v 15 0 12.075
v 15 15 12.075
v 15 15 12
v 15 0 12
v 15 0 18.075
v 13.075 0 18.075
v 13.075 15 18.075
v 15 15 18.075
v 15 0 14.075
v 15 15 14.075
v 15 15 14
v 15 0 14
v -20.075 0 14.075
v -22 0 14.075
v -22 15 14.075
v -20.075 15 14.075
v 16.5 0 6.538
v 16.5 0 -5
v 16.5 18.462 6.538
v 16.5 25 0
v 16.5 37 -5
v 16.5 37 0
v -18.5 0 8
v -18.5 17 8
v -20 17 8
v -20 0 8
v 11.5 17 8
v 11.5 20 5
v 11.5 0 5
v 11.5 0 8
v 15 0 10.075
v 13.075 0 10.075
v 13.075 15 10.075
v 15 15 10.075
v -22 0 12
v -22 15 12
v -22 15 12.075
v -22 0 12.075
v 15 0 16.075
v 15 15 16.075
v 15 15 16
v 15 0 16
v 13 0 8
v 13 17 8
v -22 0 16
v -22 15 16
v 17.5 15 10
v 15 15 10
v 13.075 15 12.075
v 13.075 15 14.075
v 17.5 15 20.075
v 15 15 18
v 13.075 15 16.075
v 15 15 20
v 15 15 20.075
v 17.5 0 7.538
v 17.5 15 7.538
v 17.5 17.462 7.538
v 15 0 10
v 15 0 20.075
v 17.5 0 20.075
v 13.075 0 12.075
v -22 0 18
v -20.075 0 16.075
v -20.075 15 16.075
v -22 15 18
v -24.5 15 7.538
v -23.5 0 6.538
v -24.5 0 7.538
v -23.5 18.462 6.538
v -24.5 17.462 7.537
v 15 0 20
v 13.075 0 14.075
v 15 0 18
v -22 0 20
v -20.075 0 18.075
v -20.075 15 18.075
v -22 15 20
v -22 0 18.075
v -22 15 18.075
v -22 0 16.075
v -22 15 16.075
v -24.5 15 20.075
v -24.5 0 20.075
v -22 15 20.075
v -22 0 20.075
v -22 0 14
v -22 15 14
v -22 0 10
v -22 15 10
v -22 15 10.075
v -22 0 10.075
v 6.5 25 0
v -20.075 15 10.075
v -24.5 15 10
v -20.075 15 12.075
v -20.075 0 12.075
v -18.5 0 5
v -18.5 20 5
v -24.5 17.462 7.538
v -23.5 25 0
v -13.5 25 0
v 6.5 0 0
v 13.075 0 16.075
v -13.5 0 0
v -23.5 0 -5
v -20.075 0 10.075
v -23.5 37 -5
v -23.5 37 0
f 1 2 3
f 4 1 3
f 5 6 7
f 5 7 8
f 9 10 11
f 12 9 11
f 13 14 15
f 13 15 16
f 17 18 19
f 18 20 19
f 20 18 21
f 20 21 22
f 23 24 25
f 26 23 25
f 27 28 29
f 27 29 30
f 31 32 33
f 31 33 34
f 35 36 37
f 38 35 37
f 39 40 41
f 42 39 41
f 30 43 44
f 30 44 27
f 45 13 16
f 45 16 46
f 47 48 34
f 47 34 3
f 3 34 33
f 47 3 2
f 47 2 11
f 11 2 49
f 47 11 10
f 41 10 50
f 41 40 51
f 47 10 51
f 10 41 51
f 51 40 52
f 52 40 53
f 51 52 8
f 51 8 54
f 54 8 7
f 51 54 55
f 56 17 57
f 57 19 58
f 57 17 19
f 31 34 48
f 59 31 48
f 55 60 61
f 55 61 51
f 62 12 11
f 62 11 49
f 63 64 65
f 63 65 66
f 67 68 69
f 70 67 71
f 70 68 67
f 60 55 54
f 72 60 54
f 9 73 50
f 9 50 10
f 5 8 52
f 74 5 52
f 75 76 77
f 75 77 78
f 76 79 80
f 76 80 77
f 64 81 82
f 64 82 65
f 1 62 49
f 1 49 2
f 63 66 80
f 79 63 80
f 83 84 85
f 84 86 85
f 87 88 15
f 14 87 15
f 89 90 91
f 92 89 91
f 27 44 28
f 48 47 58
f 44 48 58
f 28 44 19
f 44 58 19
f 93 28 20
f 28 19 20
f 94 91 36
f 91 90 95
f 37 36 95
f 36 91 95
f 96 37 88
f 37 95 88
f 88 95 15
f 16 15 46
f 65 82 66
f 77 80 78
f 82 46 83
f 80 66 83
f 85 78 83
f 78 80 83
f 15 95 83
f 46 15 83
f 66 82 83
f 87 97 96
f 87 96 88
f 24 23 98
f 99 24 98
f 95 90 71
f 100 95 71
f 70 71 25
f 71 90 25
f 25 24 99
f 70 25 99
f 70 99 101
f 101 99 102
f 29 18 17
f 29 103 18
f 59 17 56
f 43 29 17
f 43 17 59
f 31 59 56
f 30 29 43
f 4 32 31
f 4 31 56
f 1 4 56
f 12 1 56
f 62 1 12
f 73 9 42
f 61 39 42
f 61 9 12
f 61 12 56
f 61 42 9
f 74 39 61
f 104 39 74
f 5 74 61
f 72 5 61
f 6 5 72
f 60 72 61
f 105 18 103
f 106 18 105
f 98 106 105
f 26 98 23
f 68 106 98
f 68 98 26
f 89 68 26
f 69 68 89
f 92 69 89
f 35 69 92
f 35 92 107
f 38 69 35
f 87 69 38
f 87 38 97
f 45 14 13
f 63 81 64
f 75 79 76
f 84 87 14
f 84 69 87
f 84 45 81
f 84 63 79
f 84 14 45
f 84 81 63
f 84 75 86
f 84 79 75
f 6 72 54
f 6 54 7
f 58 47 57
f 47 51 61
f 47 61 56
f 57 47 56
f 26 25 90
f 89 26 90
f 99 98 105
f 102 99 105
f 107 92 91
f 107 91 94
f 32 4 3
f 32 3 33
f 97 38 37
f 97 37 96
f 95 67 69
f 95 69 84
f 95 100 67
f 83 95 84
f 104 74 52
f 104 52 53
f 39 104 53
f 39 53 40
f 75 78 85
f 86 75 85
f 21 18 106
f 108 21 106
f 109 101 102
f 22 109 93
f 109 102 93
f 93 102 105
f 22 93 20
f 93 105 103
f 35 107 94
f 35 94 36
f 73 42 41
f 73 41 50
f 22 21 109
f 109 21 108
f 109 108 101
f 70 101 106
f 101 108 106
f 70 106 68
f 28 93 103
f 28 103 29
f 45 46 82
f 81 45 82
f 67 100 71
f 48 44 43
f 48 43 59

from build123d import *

# Parameters (mm, degrees)
BOSS_EXTRUDE1_DEPTH = 15
SKETCH3_R           = 3.05
CUT_EXTRUDE1_DEPTH  = 15
CUT_EXTRUDE3_DEPTH  = 59.485528143
SKETCH5_W           = 12.5375
SKETCH5_H           = 15
BOSS_EXTRUDE2_DEPTH = 1
CHAMFER1_SIZE       = 1
SKETCH6_W           = 40
SKETCH6_H           = 37
BOSS_EXTRUDE3_DEPTH = 5
CHAMFER2_SIZE       = 10


# Some blends are built 0.0001 mm under size
with BuildPart() as part:
    # Sketch2 → Boss-Extrude1 (new body)
    with BuildSketch(Plane(origin=(0, 0, 0), x_dir=(1, 0, 0), z_dir=(0, 1, 0))):
        Polygon((-13.5, 0), (6.5, 0), (11.5, -5), (11.5, -41), (31.917309801, -41), (31.917309801, -35.69895288), (16.5, -35.69895288), (16.5, 5), (-23.5, 5), (-23.5, -35.69895288), (-38.917309801, -35.69895288), (-38.917309801, -41), (-18.5, -41), (-18.5, -5), align=None)
    extrude(amount=BOSS_EXTRUDE1_DEPTH)

    # Sketch3 → Cut-Extrude1 (cut)
    with BuildSketch(Plane(origin=(0, 0, 35.69895288), x_dir=(-1, 0, 0), z_dir=(0, 0, -1))):
        with Locations((26.5, 9)):
            Circle(SKETCH3_R)
        with Locations((-23.5, 9)):
            Circle(SKETCH3_R)
    extrude(amount=-CUT_EXTRUDE1_DEPTH, mode=Mode.SUBTRACT)

    # Sketch4 → Cut-Extrude3 (cut, through all)
    with BuildSketch(Plane(origin=(0, 15, 0), x_dir=(1, 0, 0), z_dir=(0, 1, 0))):
        Polygon((-22, -10.075), (-20.075, -10.075), (-22, -12), (-22, -12.075), (-20.075, -12.075), (-22, -14), (-22, -14.075), (-20.075, -14.075), (-22, -16), (-22, -16.075), (-20.075, -16.075), (-22, -18), (-22, -18.075), (-20.075, -18.075), (-22, -20), (-22, -20.075), (-23.5, -20.075), (-23.5, -35.69895288), (-38.917309801, -35.69895288), (-38.917309801, -41), (-18.5, -41), (-18.5, -16.075), (-18.5, -8), (-20, -8), (-22, -10), align=None)
        Polygon((13, -8), (11.5, -8), (11.5, -41), (31.917309801, -41), (31.917309801, -35.69895288), (16.5, -35.69895288), (16.5, -20.075), (15, -20.075), (15, -20), (13.075, -18.075), (15, -18.075), (15, -18), (13.075, -16.075), (15, -16.075), (15, -16), (13.075, -14.075), (15, -14.075), (15, -14), (13.075, -12.075), (15, -12.075), (15, -12), (13.075, -10.075), (15, -10.075), (15, -10), align=None)
    extrude(amount=-CUT_EXTRUDE3_DEPTH, mode=Mode.SUBTRACT)

    # Sketch5 → Boss-Extrude2 (add)
    with BuildSketch(Plane.ZY.offset(23.5)):
        with Locations((13.80625, 7.5)):
            Rectangle(SKETCH5_W, SKETCH5_H)
    boss_extrude2 = extrude(amount=BOSS_EXTRUDE2_DEPTH)

    # Mirror1: Boss-Extrude2 across plane
    add(boss_extrude2.mirror(Plane(origin=(-3.5, 0, 0), x_dir=(0, 0, 1), z_dir=(1, 0, 0))))

    # Chamfer1
    chamfer1_edges = [part.edges().sort_by_distance(p)[0] for p in [
        (16.5, 7.5, 7.5375),
        (-23.5, 7.5, 7.5375),
    ]]
    chamfer(chamfer1_edges, length=CHAMFER1_SIZE - 0.0001)  # a hair under: the kernel refuses the full size

    # Sketch6 → Boss-Extrude3 (add)
    with BuildSketch(Plane(origin=(0, 0, -5), x_dir=(-1, 0, 0), z_dir=(0, 0, -1))):
        with Locations((3.5, 18.5)):
            Rectangle(SKETCH6_W, SKETCH6_H)
    extrude(amount=-BOSS_EXTRUDE3_DEPTH)

    # Chamfer2
    # the kernel refuses this chamfer: 10 mm, written as the material it adds along each edge
    with BuildSketch(Plane(origin=(42.21682988, 15, 0), x_dir=(0, -0.027495876610586317, 0.9996219169112968), z_dir=(-1, 0, 0))) as chamfer2_piece_1_section:
        Polygon((CHAMFER2_SIZE * 0.999621916911, CHAMFER2_SIZE * 0.0274958766106), (-CHAMFER2_SIZE * 0.0274958766106, CHAMFER2_SIZE * 0.999621916911), (0, 0), align=None)
    chamfer2_piece_1 = extrude(amount=61.433659759, mode=Mode.PRIVATE)
    chamfer2_piece_1 = split(chamfer2_piece_1, bisect_by=Plane(origin=(15.01875, 16.231233333, 10.01875), z_dir=(0.7071067811865479, 0, -0.7071067811865472)), keep=Keep.TOP, mode=Mode.PRIVATE)
    chamfer2_piece_1 = split(chamfer2_piece_1, bisect_by=Plane(origin=(17.5, 16.231233333, 7.537533333), z_dir=(-1, 0, 0)), keep=Keep.TOP, mode=Mode.PRIVATE)
    chamfer2_piece_1 = split(chamfer2_piece_1, bisect_by=Plane(origin=(17.499966667, 16.231233333, 7.5375), z_dir=(0, 0, 1)), keep=Keep.TOP, mode=Mode.PRIVATE)
    with BuildSketch(Plane(origin=(16.5, 15, 0), x_dir=(0, -0.027495876610586317, 0.9996219169112968), z_dir=(-1, 0, 0))) as chamfer2_piece_2_section:
        Polygon((CHAMFER2_SIZE * 0.999621916911, CHAMFER2_SIZE * 0.0274958766106), (-CHAMFER2_SIZE * 0.0274958766106, CHAMFER2_SIZE * 0.999621916911), (0, 0), align=None)
    chamfer2_piece_2 = extrude(amount=35.71682988, mode=Mode.PRIVATE)
    chamfer2_piece_2 = split(chamfer2_piece_2, bisect_by=Plane(origin=(15.769248019, 18.74844553, 8), z_dir=(0, 0, -1)), keep=Keep.TOP, mode=Mode.PRIVATE)
    chamfer2_piece_2 = split(chamfer2_piece_2, bisect_by=Plane(origin=(11.5, 18.74844553, 2.503108939), z_dir=(1, 0, 0)), keep=Keep.TOP, mode=Mode.PRIVATE)
    with BuildSketch(Plane(origin=(42.21682988, 15, 0), x_dir=(0, -0.027495876610586317, 0.9996219169112968), z_dir=(-1, 0, 0))) as chamfer2_piece_3_section:
        Polygon((CHAMFER2_SIZE * 0.999621916911, CHAMFER2_SIZE * 0.0274958766106), (-CHAMFER2_SIZE * 0.0274958766106, CHAMFER2_SIZE * 0.999621916911), (0, 0), align=None)
    chamfer2_piece_3 = extrude(amount=61.433659759, mode=Mode.PRIVATE)
    chamfer2_piece_3 = split(chamfer2_piece_3, bisect_by=Plane(origin=(16.985049673, 16.407833551, 7.022649673), z_dir=(-0.7071067811865476, 0, 0.7071067811865476)), keep=Keep.TOP, mode=Mode.PRIVATE)
    chamfer2_piece_3 = split(chamfer2_piece_3, bisect_by=Plane(origin=(15.253849673, 16.407833551, 8.753849673), z_dir=(0.7071067811865476, 0, -0.7071067811865476)), keep=Keep.TOP, mode=Mode.PRIVATE)
    chamfer2_piece_3 = split(chamfer2_piece_3, bisect_by=Plane(origin=(17.5, 16.407833551, 7.184332898), z_dir=(-1, 0, 0)), keep=Keep.TOP, mode=Mode.PRIVATE)
    with BuildSketch(Plane(origin=(42.21682988, 15, 0), x_dir=(0, -0.027495876610586317, 0.9996219169112968), z_dir=(-1, 0, 0))) as chamfer2_piece_4_section:
        Polygon((CHAMFER2_SIZE * 0.999621916911, CHAMFER2_SIZE * 0.0274958766106), (-CHAMFER2_SIZE * 0.0274958766106, CHAMFER2_SIZE * 0.999621916911), (0, 0), align=None)
    chamfer2_piece_4 = extrude(amount=61.433659759, mode=Mode.PRIVATE)
    chamfer2_piece_4 = split(chamfer2_piece_4, bisect_by=Plane(origin=(8.989616943, 19.750655371, 2.489616943), z_dir=(0.7071067811865476, 0, -0.7071067811865476)), keep=Keep.TOP, mode=Mode.PRIVATE)
    chamfer2_piece_4 = split(chamfer2_piece_4, bisect_by=Plane(origin=(15, 19.750655371, 0.498689257), z_dir=(-1, 0, 0)), keep=Keep.TOP, mode=Mode.PRIVATE)
    with BuildSketch(Plane(origin=(42.21682988, 15, 0), x_dir=(0, -0.027495876610586317, 0.9996219169112968), z_dir=(-1, 0, 0))) as chamfer2_piece_5_section:
        Polygon((CHAMFER2_SIZE * 0.999621916911, CHAMFER2_SIZE * 0.0274958766106), (-CHAMFER2_SIZE * 0.0274958766106, CHAMFER2_SIZE * 0.999621916911), (0, 0), align=None)
    chamfer2_piece_5 = extrude(amount=61.433659759, mode=Mode.PRIVATE)
    chamfer2_piece_5 = split(chamfer2_piece_5, bisect_by=Plane(origin=(-18.5, 16.119619514, 7.760760971), z_dir=(-1, 0, 0)), keep=Keep.TOP, mode=Mode.PRIVATE)
    chamfer2_piece_5 = split(chamfer2_piece_5, bisect_by=Plane(origin=(-18.85841494, 16.119619514, 8), z_dir=(0, 0, -1)), keep=Keep.TOP, mode=Mode.PRIVATE)
    with BuildSketch(Plane(origin=(42.21682988, 15, 0), x_dir=(0, -0.027495876610586317, 0.9996219169112968), z_dir=(-1, 0, 0))) as chamfer2_piece_6_section:
        Polygon((CHAMFER2_SIZE * 0.999621916911, CHAMFER2_SIZE * 0.0274958766106), (-CHAMFER2_SIZE * 0.0274958766106, CHAMFER2_SIZE * 0.999621916911), (0, 0), align=None)
    chamfer2_piece_6 = extrude(amount=61.433659759, mode=Mode.PRIVATE)
    chamfer2_piece_6 = split(chamfer2_piece_6, bisect_by=Plane(origin=(-15.875, 19.25, 2.375), z_dir=(-0.7071067811865475, 0, -0.7071067811865477)), keep=Keep.TOP, mode=Mode.PRIVATE)
    with BuildSketch(Plane(origin=(12.21682988, 15, 0), x_dir=(0, -0.027495876610586317, 0.9996219169112968), z_dir=(-1, 0, 0))) as chamfer2_piece_7_section:
        Polygon((CHAMFER2_SIZE * 0.999621916911, CHAMFER2_SIZE * 0.0274958766106), (-CHAMFER2_SIZE * 0.0274958766106, CHAMFER2_SIZE * 0.999621916911), (0, 0), align=None)
    chamfer2_piece_7 = extrude(amount=61.433659759, mode=Mode.PRIVATE)
    chamfer2_piece_7 = split(chamfer2_piece_7, bisect_by=Plane(origin=(11.85841494, 16.119619514, 8), z_dir=(0, 0, -1)), keep=Keep.TOP, mode=Mode.PRIVATE)
    chamfer2_piece_7 = split(chamfer2_piece_7, bisect_by=Plane(origin=(11.5, 16.119619514, 7.760760971), z_dir=(1, 0, 0)), keep=Keep.TOP, mode=Mode.PRIVATE)
    with BuildSketch(Plane(origin=(12.21682988, 15, 0), x_dir=(0, -0.027495876610586317, 0.9996219169112968), z_dir=(-1, 0, 0))) as chamfer2_piece_8_section:
        Polygon((CHAMFER2_SIZE * 0.999621916911, CHAMFER2_SIZE * 0.0274958766106), (-CHAMFER2_SIZE * 0.0274958766106, CHAMFER2_SIZE * 0.999621916911), (0, 0), align=None)
    chamfer2_piece_8 = extrude(amount=35.71682988, mode=Mode.PRIVATE)
    chamfer2_piece_8 = split(chamfer2_piece_8, bisect_by=Plane(origin=(-18.5, 16.112575477, 7.774849047), z_dir=(-1, 0, 0)), keep=Keep.TOP, mode=Mode.PRIVATE)
    chamfer2_piece_8 = split(chamfer2_piece_8, bisect_by=Plane(origin=(-19.137424523, 16.112575477, 8), z_dir=(0, 0, -1)), keep=Keep.TOP, mode=Mode.PRIVATE)
    with BuildSketch(Plane(origin=(12.21682988, 15, 0), x_dir=(0, -0.027495876610586317, 0.9996219169112968), z_dir=(-1, 0, 0))) as chamfer2_piece_9_section:
        Polygon((CHAMFER2_SIZE * 0.999621916911, CHAMFER2_SIZE * 0.0274958766106), (-CHAMFER2_SIZE * 0.0274958766106, CHAMFER2_SIZE * 0.999621916911), (0, 0), align=None)
    chamfer2_piece_9 = extrude(amount=61.433659759, mode=Mode.PRIVATE)
    chamfer2_piece_9 = split(chamfer2_piece_9, bisect_by=Plane(origin=(-18.5, 15.733974359, 8.532051282), z_dir=(-1, 0, 0)), keep=Keep.TOP, mode=Mode.PRIVATE)
    chamfer2_piece_9 = split(chamfer2_piece_9, bisect_by=Plane(origin=(-20.863782051, 15.733974359, 8.863782051), z_dir=(-0.7071067811865476, 0, -0.7071067811865476)), keep=Keep.TOP, mode=Mode.PRIVATE)
    chamfer2_piece_9 = split(chamfer2_piece_9, bisect_by=Plane(origin=(-24.5, 15.733974359, 8.532051282), z_dir=(1, 0, 0)), keep=Keep.TOP, mode=Mode.PRIVATE)
    chamfer2_piece_9 = split(chamfer2_piece_9, bisect_by=Plane(origin=(-23.344982051, 15.733974359, 6.382582051), z_dir=(0.7071067811865476, 0, 0.7071067811865476)), keep=Keep.TOP, mode=Mode.PRIVATE)
    with BuildSketch(Plane(origin=(12.21682988, 15, 0), x_dir=(0, -0.027495876610586317, 0.9996219169112968), z_dir=(-1, 0, 0))) as chamfer2_piece_10_section:
        Polygon((CHAMFER2_SIZE * 0.999621916911, CHAMFER2_SIZE * 0.0274958766106), (-CHAMFER2_SIZE * 0.0274958766106, CHAMFER2_SIZE * 0.999621916911), (0, 0), align=None)
    chamfer2_piece_10 = extrude(amount=61.433659759, mode=Mode.PRIVATE)
    chamfer2_piece_10 = split(chamfer2_piece_10, bisect_by=Plane(origin=(8.875, 19.25, 2.375), z_dir=(0.7071067811865476, 0, -0.7071067811865476)), keep=Keep.TOP, mode=Mode.PRIVATE)
    with BuildSketch(Plane(origin=(12.21682988, 15, 0), x_dir=(0, -0.027495876610586317, 0.9996219169112968), z_dir=(-1, 0, 0))) as chamfer2_piece_11_section:
        Polygon((CHAMFER2_SIZE * 0.999621916911, CHAMFER2_SIZE * 0.0274958766106), (-CHAMFER2_SIZE * 0.0274958766106, CHAMFER2_SIZE * 0.999621916911), (0, 0), align=None)
    chamfer2_piece_11 = extrude(amount=35.71682988, mode=Mode.PRIVATE)
    chamfer2_piece_11 = split(chamfer2_piece_11, bisect_by=Plane(origin=(-15.86117072, 19.18959267, 2.36117072), z_dir=(-0.7071067811865475, 0, -0.7071067811865477)), keep=Keep.TOP, mode=Mode.PRIVATE)
    with BuildSketch(Plane(origin=(12.21682988, 15, 0), x_dir=(0, -0.027495876610586317, 0.9996219169112968), z_dir=(-1, 0, 0))) as chamfer2_piece_12_section:
        Polygon((CHAMFER2_SIZE * 0.999621916911, CHAMFER2_SIZE * 0.0274958766106), (-CHAMFER2_SIZE * 0.0274958766106, CHAMFER2_SIZE * 0.999621916911), (0, 0), align=None)
    chamfer2_piece_12 = extrude(amount=61.433659759, mode=Mode.PRIVATE)
    chamfer2_piece_12 = split(chamfer2_piece_12, bisect_by=Plane(origin=(-24.5, 16.231233333, 7.537533333), z_dir=(1, 0, 0)), keep=Keep.TOP, mode=Mode.PRIVATE)
    chamfer2_piece_12 = split(chamfer2_piece_12, bisect_by=Plane(origin=(-24.499966667, 16.231233333, 7.5375), z_dir=(0, 0, 1)), keep=Keep.TOP, mode=Mode.PRIVATE)
    chamfer2_piece_12 = split(chamfer2_piece_12, bisect_by=Plane(origin=(-23.5, 16.231233333, 7.537533333), z_dir=(-1, 0, 0)), keep=Keep.TOP, mode=Mode.PRIVATE)
    add([chamfer2_piece_1, chamfer2_piece_2, chamfer2_piece_3, chamfer2_piece_4, chamfer2_piece_5, chamfer2_piece_6, chamfer2_piece_7, chamfer2_piece_8, chamfer2_piece_9, chamfer2_piece_10, chamfer2_piece_11, chamfer2_piece_12])


solid = part.part
